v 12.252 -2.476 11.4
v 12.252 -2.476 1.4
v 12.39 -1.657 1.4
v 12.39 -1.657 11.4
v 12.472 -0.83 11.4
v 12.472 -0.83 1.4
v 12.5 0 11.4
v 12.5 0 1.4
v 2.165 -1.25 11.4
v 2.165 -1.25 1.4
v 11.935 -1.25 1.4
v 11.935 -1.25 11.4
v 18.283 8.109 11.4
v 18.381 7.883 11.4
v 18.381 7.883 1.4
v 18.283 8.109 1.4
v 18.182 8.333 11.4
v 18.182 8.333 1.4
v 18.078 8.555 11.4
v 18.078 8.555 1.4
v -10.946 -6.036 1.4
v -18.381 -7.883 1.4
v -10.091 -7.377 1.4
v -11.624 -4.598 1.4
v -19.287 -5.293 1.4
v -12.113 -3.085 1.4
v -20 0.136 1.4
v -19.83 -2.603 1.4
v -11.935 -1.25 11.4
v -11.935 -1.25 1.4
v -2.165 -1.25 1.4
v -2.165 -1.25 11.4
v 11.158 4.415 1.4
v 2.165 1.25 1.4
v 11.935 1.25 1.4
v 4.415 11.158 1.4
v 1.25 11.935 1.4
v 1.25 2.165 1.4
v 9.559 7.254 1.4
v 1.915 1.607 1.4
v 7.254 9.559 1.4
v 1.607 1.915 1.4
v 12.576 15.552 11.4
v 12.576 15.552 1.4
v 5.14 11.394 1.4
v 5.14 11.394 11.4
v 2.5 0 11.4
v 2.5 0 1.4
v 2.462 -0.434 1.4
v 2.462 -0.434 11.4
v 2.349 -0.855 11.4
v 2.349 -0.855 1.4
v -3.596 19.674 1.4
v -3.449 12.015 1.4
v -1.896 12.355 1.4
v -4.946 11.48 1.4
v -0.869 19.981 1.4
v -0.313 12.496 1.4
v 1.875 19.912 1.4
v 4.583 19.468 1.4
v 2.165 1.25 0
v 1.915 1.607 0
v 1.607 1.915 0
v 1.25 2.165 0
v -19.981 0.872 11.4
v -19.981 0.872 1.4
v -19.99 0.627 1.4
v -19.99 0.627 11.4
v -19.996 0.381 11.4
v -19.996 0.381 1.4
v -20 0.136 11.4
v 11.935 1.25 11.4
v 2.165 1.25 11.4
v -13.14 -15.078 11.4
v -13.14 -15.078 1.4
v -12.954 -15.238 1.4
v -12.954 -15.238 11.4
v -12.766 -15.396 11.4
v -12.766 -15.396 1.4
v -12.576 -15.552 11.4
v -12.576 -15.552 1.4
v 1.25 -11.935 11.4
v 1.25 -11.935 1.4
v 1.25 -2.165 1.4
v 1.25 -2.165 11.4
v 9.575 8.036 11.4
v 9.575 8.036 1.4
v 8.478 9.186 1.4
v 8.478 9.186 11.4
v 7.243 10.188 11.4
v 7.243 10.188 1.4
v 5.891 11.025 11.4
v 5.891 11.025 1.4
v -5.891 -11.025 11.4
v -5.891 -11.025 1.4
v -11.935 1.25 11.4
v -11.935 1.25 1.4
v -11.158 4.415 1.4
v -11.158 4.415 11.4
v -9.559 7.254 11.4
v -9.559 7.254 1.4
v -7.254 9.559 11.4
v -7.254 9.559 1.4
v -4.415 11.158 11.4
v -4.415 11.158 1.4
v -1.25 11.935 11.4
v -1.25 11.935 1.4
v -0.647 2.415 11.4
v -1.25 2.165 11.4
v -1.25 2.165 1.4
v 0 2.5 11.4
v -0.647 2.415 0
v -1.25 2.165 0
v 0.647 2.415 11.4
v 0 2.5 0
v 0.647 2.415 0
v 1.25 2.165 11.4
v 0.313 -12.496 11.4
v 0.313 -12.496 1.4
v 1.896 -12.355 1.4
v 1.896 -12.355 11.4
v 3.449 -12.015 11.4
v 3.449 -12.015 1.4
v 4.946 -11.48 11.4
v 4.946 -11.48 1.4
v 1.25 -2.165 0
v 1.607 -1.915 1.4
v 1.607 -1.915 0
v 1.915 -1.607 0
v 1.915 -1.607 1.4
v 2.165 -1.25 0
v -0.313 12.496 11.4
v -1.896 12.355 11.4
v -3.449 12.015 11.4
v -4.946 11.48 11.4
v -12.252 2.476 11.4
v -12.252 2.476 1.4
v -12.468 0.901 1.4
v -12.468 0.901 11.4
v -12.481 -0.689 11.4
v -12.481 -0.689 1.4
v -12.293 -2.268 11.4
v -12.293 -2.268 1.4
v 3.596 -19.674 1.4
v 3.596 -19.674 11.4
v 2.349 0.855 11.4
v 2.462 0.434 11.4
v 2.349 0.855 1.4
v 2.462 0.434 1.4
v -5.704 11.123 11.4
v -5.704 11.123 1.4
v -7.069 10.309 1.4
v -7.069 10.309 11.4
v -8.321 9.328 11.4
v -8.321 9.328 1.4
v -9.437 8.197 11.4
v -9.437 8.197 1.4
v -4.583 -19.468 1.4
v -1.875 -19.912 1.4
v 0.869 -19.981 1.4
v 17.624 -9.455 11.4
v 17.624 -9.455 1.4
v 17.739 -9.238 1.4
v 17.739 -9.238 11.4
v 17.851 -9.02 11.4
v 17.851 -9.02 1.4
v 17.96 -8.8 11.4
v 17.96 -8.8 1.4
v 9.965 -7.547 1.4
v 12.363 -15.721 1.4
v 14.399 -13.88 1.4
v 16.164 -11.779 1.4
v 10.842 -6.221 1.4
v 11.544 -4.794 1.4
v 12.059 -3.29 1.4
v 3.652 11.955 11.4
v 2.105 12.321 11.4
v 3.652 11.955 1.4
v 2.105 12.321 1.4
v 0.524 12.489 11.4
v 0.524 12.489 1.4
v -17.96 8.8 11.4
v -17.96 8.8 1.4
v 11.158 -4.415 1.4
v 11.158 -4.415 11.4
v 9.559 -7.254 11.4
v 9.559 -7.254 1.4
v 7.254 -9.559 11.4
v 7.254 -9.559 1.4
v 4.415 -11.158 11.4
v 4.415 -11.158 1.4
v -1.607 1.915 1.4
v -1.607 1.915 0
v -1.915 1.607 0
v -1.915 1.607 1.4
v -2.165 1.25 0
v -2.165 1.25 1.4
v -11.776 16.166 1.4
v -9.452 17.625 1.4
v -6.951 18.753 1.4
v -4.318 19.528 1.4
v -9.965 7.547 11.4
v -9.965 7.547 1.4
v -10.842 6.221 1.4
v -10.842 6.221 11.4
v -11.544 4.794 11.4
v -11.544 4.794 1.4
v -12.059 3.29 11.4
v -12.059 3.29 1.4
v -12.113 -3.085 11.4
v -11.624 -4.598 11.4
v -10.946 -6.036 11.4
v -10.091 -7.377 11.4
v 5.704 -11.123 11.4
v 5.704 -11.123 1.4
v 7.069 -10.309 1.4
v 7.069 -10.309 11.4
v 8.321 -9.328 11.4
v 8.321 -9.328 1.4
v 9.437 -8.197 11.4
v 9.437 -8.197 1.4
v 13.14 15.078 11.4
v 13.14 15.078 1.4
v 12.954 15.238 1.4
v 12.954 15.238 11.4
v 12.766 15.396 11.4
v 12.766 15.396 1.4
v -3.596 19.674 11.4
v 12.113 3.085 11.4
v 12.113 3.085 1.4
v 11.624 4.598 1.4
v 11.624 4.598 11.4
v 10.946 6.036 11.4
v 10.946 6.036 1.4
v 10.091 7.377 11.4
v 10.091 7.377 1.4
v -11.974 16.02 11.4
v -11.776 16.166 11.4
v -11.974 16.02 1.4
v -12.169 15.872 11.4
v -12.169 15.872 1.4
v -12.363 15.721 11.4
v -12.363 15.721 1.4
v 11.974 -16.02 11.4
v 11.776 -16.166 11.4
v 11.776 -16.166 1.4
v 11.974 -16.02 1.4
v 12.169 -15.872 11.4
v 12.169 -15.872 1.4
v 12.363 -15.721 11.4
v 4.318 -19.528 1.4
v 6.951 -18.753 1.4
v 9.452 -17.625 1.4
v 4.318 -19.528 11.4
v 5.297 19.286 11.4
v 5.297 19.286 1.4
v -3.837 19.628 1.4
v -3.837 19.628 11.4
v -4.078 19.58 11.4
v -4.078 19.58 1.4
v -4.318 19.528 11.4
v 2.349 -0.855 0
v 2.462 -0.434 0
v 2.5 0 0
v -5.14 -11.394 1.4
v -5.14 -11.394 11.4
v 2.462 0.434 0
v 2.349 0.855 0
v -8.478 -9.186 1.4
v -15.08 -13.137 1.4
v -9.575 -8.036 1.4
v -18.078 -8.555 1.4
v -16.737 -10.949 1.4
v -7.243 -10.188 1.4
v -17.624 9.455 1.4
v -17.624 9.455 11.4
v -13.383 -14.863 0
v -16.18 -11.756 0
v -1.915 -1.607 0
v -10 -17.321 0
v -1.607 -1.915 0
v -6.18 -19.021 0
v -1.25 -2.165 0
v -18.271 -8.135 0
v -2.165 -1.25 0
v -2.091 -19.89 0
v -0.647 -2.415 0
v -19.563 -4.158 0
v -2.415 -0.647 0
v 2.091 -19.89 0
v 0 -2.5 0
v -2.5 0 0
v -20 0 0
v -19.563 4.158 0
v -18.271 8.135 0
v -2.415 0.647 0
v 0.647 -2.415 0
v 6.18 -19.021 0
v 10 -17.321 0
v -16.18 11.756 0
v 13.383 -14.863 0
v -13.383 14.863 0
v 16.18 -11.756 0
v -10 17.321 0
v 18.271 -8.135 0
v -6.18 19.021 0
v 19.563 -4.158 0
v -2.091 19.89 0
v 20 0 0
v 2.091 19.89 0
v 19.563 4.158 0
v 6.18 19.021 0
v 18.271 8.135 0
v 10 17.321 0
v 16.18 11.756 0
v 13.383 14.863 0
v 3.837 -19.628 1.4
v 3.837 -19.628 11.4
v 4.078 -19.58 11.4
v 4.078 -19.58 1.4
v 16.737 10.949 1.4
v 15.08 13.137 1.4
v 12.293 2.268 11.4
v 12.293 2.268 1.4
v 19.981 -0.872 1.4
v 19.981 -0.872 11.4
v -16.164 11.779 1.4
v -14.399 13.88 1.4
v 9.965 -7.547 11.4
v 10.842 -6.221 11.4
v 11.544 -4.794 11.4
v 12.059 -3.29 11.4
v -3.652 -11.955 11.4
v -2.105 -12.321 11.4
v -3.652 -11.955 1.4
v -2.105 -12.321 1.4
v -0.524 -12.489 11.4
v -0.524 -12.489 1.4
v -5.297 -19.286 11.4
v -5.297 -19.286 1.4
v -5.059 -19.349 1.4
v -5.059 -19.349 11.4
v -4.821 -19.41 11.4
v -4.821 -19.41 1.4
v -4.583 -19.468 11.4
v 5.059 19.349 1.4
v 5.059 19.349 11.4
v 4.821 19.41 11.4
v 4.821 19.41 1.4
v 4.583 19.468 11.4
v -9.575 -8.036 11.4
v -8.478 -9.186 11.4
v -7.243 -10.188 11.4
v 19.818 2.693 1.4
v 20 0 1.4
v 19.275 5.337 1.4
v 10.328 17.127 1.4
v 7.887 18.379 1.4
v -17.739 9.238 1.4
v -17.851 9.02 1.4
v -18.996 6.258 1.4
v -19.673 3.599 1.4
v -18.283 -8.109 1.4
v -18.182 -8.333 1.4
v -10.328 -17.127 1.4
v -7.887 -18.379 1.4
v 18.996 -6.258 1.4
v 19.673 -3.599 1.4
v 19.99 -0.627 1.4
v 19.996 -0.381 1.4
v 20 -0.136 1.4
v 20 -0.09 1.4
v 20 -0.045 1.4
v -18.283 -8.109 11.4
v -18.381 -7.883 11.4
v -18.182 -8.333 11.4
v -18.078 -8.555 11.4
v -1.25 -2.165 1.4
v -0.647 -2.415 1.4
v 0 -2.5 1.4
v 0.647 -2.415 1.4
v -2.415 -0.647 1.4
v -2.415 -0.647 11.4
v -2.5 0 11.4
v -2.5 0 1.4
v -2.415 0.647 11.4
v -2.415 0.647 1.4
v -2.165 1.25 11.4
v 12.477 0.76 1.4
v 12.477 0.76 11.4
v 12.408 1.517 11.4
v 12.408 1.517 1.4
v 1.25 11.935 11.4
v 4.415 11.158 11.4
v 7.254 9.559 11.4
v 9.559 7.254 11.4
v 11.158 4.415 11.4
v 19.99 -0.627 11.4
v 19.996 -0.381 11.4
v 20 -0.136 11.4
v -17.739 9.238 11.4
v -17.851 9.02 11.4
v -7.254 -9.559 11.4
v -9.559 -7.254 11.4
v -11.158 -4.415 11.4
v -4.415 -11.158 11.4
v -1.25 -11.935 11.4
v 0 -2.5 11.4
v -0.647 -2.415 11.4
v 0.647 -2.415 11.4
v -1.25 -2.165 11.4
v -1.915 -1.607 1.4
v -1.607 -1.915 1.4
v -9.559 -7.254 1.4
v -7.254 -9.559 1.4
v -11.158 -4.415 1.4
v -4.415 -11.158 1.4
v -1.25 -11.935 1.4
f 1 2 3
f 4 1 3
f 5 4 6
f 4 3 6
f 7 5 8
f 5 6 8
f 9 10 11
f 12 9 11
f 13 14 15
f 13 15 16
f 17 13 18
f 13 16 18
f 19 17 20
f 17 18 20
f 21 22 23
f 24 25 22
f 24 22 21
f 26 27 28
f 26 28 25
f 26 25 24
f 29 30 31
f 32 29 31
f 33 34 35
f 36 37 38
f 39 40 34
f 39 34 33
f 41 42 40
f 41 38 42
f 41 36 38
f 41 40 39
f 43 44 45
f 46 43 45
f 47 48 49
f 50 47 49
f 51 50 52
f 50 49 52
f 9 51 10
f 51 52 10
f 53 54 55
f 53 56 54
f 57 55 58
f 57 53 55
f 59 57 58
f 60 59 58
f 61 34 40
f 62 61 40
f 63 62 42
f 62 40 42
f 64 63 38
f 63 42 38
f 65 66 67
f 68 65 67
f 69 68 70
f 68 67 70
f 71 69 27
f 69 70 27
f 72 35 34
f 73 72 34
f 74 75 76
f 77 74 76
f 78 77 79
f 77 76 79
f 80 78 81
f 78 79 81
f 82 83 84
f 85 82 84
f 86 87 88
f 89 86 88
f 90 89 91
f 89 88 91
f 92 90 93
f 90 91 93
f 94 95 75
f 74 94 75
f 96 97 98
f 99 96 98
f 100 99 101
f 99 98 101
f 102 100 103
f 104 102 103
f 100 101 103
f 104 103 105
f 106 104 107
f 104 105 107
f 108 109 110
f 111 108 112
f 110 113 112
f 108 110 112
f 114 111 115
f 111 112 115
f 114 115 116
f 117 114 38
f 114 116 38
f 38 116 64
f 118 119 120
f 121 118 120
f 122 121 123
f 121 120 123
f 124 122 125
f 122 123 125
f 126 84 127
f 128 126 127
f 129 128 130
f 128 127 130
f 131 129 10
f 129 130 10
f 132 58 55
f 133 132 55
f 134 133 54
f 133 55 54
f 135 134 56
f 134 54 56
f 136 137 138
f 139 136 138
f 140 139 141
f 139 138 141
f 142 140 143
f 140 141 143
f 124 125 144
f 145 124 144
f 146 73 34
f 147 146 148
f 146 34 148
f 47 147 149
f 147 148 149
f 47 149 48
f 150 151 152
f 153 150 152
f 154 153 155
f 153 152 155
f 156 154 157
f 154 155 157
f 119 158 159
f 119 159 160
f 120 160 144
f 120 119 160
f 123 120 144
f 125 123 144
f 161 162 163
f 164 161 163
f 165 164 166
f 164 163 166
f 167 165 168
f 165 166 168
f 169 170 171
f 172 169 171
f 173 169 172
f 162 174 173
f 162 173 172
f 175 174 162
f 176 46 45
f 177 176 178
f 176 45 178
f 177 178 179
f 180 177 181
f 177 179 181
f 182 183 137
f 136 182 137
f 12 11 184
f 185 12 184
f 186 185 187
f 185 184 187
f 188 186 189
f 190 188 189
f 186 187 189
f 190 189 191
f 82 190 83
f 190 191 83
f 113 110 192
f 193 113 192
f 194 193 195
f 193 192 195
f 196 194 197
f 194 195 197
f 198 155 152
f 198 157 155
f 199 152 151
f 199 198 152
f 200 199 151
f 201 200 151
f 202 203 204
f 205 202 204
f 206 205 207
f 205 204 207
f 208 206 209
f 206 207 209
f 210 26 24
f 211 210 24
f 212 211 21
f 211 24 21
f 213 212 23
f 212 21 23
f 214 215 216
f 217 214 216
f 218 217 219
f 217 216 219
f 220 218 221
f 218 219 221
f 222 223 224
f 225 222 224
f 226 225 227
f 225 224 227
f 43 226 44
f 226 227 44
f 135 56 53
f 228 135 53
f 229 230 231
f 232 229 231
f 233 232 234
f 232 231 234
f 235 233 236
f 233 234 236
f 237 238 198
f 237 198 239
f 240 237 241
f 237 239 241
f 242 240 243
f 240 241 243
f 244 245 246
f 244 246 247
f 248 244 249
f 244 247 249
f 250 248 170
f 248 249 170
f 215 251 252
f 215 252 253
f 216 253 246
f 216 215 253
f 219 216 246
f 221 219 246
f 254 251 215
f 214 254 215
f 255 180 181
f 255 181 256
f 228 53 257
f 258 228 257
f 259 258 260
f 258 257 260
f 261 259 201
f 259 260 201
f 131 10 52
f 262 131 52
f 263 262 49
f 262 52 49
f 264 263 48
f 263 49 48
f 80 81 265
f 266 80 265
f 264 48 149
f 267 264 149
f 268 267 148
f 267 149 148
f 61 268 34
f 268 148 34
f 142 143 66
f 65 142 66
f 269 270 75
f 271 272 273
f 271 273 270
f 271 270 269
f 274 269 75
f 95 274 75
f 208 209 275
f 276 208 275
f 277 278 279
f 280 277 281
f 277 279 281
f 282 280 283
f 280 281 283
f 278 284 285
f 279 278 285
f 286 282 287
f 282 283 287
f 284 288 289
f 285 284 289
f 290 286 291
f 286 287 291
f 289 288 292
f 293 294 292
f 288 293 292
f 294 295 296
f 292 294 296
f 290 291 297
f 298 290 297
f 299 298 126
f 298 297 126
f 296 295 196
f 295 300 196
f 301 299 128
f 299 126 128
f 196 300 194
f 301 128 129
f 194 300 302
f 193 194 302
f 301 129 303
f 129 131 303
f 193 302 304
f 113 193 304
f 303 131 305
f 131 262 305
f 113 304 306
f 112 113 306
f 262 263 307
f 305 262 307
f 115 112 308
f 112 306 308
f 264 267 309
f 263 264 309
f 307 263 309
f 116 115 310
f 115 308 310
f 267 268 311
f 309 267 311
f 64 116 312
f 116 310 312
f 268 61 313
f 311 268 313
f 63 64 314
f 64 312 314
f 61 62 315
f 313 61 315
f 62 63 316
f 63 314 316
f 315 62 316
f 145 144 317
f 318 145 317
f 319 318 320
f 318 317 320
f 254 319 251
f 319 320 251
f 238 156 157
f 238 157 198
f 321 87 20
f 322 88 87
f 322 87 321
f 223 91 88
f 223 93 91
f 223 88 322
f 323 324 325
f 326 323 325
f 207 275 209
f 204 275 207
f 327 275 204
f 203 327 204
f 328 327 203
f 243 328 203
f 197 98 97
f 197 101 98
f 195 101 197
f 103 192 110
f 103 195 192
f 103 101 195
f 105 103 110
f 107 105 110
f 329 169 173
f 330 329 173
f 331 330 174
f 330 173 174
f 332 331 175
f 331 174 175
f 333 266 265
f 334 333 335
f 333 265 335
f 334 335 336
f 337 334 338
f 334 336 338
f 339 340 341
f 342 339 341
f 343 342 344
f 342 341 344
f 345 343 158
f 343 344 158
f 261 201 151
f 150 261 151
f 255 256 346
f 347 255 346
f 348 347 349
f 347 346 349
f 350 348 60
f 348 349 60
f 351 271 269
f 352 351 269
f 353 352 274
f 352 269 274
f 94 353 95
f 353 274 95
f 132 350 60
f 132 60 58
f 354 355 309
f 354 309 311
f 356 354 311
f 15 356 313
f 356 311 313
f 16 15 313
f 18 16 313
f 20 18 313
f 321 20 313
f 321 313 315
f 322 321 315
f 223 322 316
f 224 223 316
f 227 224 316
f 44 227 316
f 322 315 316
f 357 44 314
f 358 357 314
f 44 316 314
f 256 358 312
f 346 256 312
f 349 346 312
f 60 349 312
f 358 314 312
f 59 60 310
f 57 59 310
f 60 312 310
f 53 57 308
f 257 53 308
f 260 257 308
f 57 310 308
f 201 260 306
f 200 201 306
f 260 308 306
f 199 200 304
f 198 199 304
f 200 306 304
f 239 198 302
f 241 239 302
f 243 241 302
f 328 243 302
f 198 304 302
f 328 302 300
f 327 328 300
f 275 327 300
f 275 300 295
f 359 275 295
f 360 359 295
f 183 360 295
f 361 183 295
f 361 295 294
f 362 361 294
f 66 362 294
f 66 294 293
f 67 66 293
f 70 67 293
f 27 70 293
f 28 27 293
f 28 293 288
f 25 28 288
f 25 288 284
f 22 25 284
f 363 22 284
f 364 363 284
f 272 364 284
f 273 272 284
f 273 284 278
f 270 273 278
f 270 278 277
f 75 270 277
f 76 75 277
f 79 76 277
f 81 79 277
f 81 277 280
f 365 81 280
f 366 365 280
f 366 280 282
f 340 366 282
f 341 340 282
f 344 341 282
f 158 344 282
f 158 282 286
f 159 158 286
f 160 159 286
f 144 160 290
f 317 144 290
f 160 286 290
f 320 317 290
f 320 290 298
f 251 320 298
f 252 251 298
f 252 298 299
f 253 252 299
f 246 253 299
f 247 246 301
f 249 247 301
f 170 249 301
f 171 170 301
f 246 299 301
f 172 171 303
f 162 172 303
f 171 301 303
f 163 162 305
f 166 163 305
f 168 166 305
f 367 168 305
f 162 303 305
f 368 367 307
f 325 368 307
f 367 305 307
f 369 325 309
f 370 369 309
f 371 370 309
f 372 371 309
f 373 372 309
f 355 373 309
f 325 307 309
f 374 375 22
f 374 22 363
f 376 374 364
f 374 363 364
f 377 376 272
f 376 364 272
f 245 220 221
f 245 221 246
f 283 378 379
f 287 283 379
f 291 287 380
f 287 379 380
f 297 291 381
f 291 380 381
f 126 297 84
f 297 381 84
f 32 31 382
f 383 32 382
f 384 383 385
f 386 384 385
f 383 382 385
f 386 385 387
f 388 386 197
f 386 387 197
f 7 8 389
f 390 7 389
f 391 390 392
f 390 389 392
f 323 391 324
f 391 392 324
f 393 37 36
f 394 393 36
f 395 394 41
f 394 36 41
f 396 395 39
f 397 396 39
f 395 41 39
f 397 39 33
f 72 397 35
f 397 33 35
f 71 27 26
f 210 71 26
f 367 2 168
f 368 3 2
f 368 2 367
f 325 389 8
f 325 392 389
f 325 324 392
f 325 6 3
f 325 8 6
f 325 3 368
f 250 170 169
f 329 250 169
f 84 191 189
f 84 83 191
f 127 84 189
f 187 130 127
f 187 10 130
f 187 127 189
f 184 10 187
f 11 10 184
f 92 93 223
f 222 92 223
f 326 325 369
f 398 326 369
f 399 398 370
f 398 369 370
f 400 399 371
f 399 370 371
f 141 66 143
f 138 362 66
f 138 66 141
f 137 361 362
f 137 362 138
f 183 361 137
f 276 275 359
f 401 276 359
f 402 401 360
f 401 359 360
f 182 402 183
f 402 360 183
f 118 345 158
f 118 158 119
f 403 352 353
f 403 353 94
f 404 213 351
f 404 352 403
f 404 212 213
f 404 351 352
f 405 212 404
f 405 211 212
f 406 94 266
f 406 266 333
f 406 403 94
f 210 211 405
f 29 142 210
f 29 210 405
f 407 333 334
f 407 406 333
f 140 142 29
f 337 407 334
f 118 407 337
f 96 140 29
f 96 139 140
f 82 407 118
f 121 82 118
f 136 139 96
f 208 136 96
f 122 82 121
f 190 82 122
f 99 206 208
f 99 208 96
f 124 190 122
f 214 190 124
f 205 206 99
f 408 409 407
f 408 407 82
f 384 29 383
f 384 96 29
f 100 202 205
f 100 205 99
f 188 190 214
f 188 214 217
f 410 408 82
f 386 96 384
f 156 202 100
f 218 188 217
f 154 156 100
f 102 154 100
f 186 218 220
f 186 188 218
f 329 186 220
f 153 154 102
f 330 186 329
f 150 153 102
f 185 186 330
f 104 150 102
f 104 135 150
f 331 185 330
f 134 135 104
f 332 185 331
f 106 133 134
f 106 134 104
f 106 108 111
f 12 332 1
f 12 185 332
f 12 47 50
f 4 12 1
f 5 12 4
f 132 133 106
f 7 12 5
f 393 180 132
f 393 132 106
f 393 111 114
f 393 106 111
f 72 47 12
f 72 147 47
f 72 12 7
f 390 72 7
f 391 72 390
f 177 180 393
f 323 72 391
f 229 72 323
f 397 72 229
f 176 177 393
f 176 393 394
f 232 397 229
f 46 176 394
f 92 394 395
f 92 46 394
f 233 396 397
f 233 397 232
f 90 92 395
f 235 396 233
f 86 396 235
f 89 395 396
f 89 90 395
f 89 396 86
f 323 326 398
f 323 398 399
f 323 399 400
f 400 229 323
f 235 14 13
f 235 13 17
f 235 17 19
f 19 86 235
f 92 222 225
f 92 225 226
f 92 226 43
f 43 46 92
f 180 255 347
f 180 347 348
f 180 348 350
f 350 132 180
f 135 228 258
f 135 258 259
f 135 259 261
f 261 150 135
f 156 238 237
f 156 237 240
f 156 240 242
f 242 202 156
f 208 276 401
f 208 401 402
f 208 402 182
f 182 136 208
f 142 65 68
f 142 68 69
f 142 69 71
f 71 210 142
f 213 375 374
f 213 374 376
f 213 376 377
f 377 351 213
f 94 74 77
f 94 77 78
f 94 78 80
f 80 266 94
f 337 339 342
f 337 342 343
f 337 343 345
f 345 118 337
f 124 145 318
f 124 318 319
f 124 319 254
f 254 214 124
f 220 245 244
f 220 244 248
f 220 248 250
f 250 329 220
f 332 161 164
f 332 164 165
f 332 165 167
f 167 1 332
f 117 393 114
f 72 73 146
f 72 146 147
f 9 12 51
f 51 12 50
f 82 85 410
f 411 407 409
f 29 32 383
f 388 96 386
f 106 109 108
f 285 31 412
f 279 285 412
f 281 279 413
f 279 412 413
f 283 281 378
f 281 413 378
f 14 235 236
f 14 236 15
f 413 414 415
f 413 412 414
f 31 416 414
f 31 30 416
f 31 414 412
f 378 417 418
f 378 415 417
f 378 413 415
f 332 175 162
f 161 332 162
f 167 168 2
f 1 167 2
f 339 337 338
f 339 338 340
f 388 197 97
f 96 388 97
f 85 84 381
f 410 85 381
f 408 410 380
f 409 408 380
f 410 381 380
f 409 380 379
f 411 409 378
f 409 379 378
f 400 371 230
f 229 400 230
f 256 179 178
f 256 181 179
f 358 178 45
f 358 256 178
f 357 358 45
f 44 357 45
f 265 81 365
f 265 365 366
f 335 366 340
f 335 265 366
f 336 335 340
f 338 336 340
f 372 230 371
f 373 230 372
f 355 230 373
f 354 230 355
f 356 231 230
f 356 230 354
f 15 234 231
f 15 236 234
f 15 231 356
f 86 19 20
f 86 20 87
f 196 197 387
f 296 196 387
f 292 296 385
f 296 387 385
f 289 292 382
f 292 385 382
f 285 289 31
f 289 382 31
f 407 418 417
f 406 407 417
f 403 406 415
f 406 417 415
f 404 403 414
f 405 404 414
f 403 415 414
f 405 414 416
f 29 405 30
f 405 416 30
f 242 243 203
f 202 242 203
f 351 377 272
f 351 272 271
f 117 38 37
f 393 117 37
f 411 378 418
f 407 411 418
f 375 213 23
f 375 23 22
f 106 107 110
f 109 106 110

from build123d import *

# Parameters (mm, degrees)
F0_R     = 20
F1_DEPTH = 1.4
F3_DEPTH = 10
F4_DEPTH = 10
F5_DEPTH = 25.4
F6_DEPTH = 10


# Not quite as in the source:
# - after a boolean that leaves OpenCascade's solid faulty, fix() repairs it


with BuildPart() as f1:
    # F0 (on Top) → F1 (new body)
    with BuildSketch(Plane.XY):
        Circle(F0_R)
    extrude(amount=F1_DEPTH)

    # F2 (on face) → F3 (join)
    with BuildSketch(Plane.XY.offset(1.4)):
        with BuildLine():
            ThreePointArc((-5.7035176523, 11.1229441422), (-5.3278826262, 11.3076817572), (-4.9462725406, 11.4797381483))
            Line((-4.9462725406, 11.4797381483), (-3.5956301682, 19.6741313326))
            ThreePointArc((-3.5956301682, 19.6741313326), (-3.9575397764, 19.6045372023), (-4.3181055831, 19.528286258))
            Line((-4.3181055831, 19.528286258), (-5.7035176523, 11.1229441422))
        make_face()
        with BuildLine():
            ThreePointArc((-0.3126272478, 12.4960899566), (0.1059628635, 12.4995508668), (0.5244341406, 12.4889939079))
            Line((0.5244341406, 12.4889939079), (5.2967348245, 19.2858652956))
            ThreePointArc((5.2967348245, 19.2858652956), (4.940469773, 19.3801898448), (4.5825271615, 19.4679337582))
            Line((4.5825271615, 19.4679337582), (-0.3126272478, 12.4960899566))
        make_face()
        with BuildLine():
            ThreePointArc((5.1401828172, 11.3942319007), (5.5188211085, 11.2157306303), (5.8912702085, 11.0246512566))
            Line((5.8912702085, 11.0246512566), (13.140016525, 15.0777971111))
            ThreePointArc((13.140016525, 15.0777971111), (12.859958693, 15.3173582061), (12.5755342007, 15.5517182191))
            Line((12.5755342007, 15.5517182191), (5.1401828172, 11.3942319007))
        make_face()
        with BuildLine():
            ThreePointArc((9.574916635, 8.0356064757), (9.8386091491, 7.7104973906), (10.09126796, 7.3767412155))
            Line((10.09126796, 7.3767412155), (18.3807568009, 7.8833862917))
            ThreePointArc((18.3807568009, 7.8833862917), (18.2323750768, 8.2207359196), (18.0778024627, 8.5552941574))
            Line((18.0778024627, 8.5552941574), (9.574916635, 8.0356064757))
        make_face()
        with BuildLine():
            ThreePointArc((12.1132207847, 3.085430638), (12.2097399851, 2.6781055797), (12.2925663307, 2.2677771068))
            Line((12.2925663307, 2.2677771068), (19.9809627673, -0.8724258661))
            ThreePointArc((19.9809627673, -0.8724258661), (19.9936459712, -0.5041039365), (19.9995402372, -0.135610836))
            Line((19.9995402372, -0.135610836), (12.1132207847, 3.085430638))
        make_face()
        with BuildLine():
            Line((17.9601237896, -8.7996564401), (12.252352999, -2.4758525779))
            ThreePointArc((12.252352999, -2.4758525779), (12.1625820744, -2.8847178862), (12.0591711811, -3.2903480703))
            Line((12.0591711811, -3.2903480703), (17.6236940072, -9.4554433816))
            ThreePointArc((17.6236940072, -9.4554433816), (17.794930075, -9.1290998255), (17.9601237896, -8.7996564401))
        make_face()
        with BuildLine():
            Line((12.3634845589, -15.7208221656), (9.9647564366, -7.5467628264))
            ThreePointArc((9.9647564366, -7.5467628264), (9.7064756196, -7.8761875959), (9.4373092832, -8.1967794587))
            Line((9.4373092832, -8.1967794587), (11.7758365085, -16.1656943719))
            ThreePointArc((11.7758365085, -16.1656943719), (12.071710037, -15.9459655331), (12.3634845589, -15.7208221656))
        make_face()
        with BuildLine():
            Line((4.3181055831, -19.528286258), (5.7035176523, -11.1229441422))
            ThreePointArc((5.7035176523, -11.1229441422), (5.3278826262, -11.3076817572), (4.9462725406, -11.4797381483))
            Line((4.9462725406, -11.4797381483), (3.5956301682, -19.6741313326))
            ThreePointArc((3.5956301682, -19.6741313326), (3.9575397764, -19.6045372023), (4.3181055831, -19.528286258))
        make_face()
        with BuildLine():
            Line((-4.5825271615, -19.4679337582), (0.3126272478, -12.4960899566))
            ThreePointArc((0.3126272478, -12.4960899566), (-0.1059628635, -12.4995508668), (-0.5244341406, -12.4889939079))
            Line((-0.5244341406, -12.4889939079), (-5.2967348245, -19.2858652956))
            ThreePointArc((-5.2967348245, -19.2858652956), (-4.940469773, -19.3801898448), (-4.5825271615, -19.4679337582))
        make_face()
        with BuildLine():
            Line((-12.5755342007, -15.5517182191), (-5.1401828172, -11.3942319007))
            ThreePointArc((-5.1401828172, -11.3942319007), (-5.5188211085, -11.2157306303), (-5.8912702085, -11.0246512566))
            Line((-5.8912702085, -11.0246512566), (-13.140016525, -15.0777971111))
            ThreePointArc((-13.140016525, -15.0777971111), (-12.859958693, -15.3173582061), (-12.5755342007, -15.5517182191))
        make_face()
        with BuildLine():
            Line((-18.0778024627, -8.5552941574), (-9.574916635, -8.0356064757))
            ThreePointArc((-9.574916635, -8.0356064757), (-9.8386091491, -7.7104973906), (-10.09126796, -7.3767412155))
            Line((-10.09126796, -7.3767412155), (-18.3807568009, -7.8833862917))
            ThreePointArc((-18.3807568009, -7.8833862917), (-18.2323750768, -8.2207359196), (-18.0778024627, -8.5552941574))
        make_face()
        with BuildLine():
            Line((-19.9995402372, 0.135610836), (-12.1132207847, -3.085430638))
            ThreePointArc((-12.1132207847, -3.085430638), (-12.2097399851, -2.6781055797), (-12.2925663307, -2.2677771068))
            Line((-12.2925663307, -2.2677771068), (-19.9809627673, 0.8724258661))
            ThreePointArc((-19.9809627673, 0.8724258661), (-19.9936459712, 0.5041039365), (-19.9995402372, 0.135610836))
        make_face()
        with BuildLine():
            ThreePointArc((-12.252352999, 2.4758525779), (-12.1625820744, 2.8847178862), (-12.0591711811, 3.2903480703))
            Line((-12.0591711811, 3.2903480703), (-17.6236940072, 9.4554433816))
            ThreePointArc((-17.6236940072, 9.4554433816), (-17.794930075, 9.1290998255), (-17.9601237896, 8.7996564401))
            Line((-17.9601237896, 8.7996564401), (-12.252352999, 2.4758525779))
        make_face()
        with BuildLine():
            ThreePointArc((-9.9647564366, 7.5467628264), (-9.7064756196, 7.8761875959), (-9.4373092832, 8.1967794587))
            Line((-9.4373092832, 8.1967794587), (-11.7758365085, 16.1656943719))
            ThreePointArc((-11.7758365085, 16.1656943719), (-12.071710037, 15.9459655331), (-12.3634845589, 15.7208221656))
            Line((-12.3634845589, 15.7208221656), (-9.9647564366, 7.5467628264))
        make_face()
    extrude(amount=F3_DEPTH)

    # F2 (on face) → F4 (join)
    with BuildSketch(Plane.XY.offset(1.4)):
        with BuildLine():
            ThreePointArc((12.252352999, -2.4758525779), (12.437934163, -1.2441035954), (12.5, 0))
            ThreePointArc((12.5, 0), (12.4480335622, 1.1386221644), (12.2925663307, 2.2677771068))
            ThreePointArc((12.2925663307, 2.2677771068), (12.2097399851, 2.6781055797), (12.1132207847, 3.085430638))
            ThreePointArc((12.1132207847, 3.085430638), (11.3076817572, 5.3278826262), (10.09126796, 7.3767412155))
            ThreePointArc((10.09126796, 7.3767412155), (9.8386091491, 7.7104973906), (9.574916635, 8.0356064757))
            ThreePointArc((9.574916635, 8.0356064757), (7.8761875959, 9.7064756196), (5.8912702085, 11.0246512566))
            ThreePointArc((5.8912702085, 11.0246512566), (5.5188211085, 11.2157306303), (5.1401828172, 11.3942319007))
            ThreePointArc((5.1401828172, 11.3942319007), (2.8847178862, 12.1625820744), (0.5244341406, 12.4889939079))
            ThreePointArc((0.5244341406, 12.4889939079), (0.1059628635, 12.4995508668), (-0.3126272478, 12.4960899566))
            ThreePointArc((-0.3126272478, 12.4960899566), (-2.6781055797, 12.2097399851), (-4.9462725406, 11.4797381483))
            ThreePointArc((-4.9462725406, 11.4797381483), (-5.3278826262, 11.3076817572), (-5.7035176523, 11.1229441422))
            ThreePointArc((-5.7035176523, 11.1229441422), (-7.7104973906, 9.8386091491), (-9.4373092832, 8.1967794587))
            ThreePointArc((-9.4373092832, 8.1967794587), (-9.7064756196, 7.8761875959), (-9.9647564366, 7.5467628264))
            ThreePointArc((-9.9647564366, 7.5467628264), (-11.2157306303, 5.5188211085), (-12.0591711811, 3.2903480703))
            ThreePointArc((-12.0591711811, 3.2903480703), (-12.1625820744, 2.8847178862), (-12.252352999, 2.4758525779))
            ThreePointArc((-12.252352999, 2.4758525779), (-12.4995508668, 0.1059628635), (-12.2925663307, -2.2677771068))
            ThreePointArc((-12.2925663307, -2.2677771068), (-12.2097399851, -2.6781055797), (-12.1132207847, -3.085430638))
            ThreePointArc((-12.1132207847, -3.085430638), (-11.3076817572, -5.3278826262), (-10.09126796, -7.3767412155))
            ThreePointArc((-10.09126796, -7.3767412155), (-9.8386091491, -7.7104973906), (-9.574916635, -8.0356064757))
            ThreePointArc((-9.574916635, -8.0356064757), (-7.8761875959, -9.7064756196), (-5.8912702085, -11.0246512566))
            ThreePointArc((-5.8912702085, -11.0246512566), (-5.5188211085, -11.2157306303), (-5.1401828172, -11.3942319007))
            ThreePointArc((-5.1401828172, -11.3942319007), (-2.8847178862, -12.1625820744), (-0.5244341406, -12.4889939079))
            ThreePointArc((-0.5244341406, -12.4889939079), (-0.1059628635, -12.4995508668), (0.3126272478, -12.4960899566))
            ThreePointArc((0.3126272478, -12.4960899566), (2.6781055797, -12.2097399851), (4.9462725406, -11.4797381483))
            ThreePointArc((4.9462725406, -11.4797381483), (5.3278826262, -11.3076817572), (5.7035176523, -11.1229441422))
            ThreePointArc((5.7035176523, -11.1229441422), (7.7104973906, -9.8386091491), (9.4373092832, -8.1967794587))
            ThreePointArc((9.4373092832, -8.1967794587), (9.7064756196, -7.8761875959), (9.9647564366, -7.5467628264))
            ThreePointArc((9.9647564366, -7.5467628264), (11.2157306303, -5.5188211085), (12.0591711811, -3.2903480703))
            ThreePointArc((12.0591711811, -3.2903480703), (12.1625820744, -2.8847178862), (12.252352999, -2.4758525779))
        make_face()
        with BuildLine():
            ThreePointArc((11.9347182623, 1.25), (11.9836684523, 0.6258517607), (12, 0))
            ThreePointArc((12, 0), (11.9836684523, -0.6258517607), (11.9347182623, -1.25))
            ThreePointArc((11.9347182623, -1.25), (8.4852813742, -8.4852813742), (1.25, -11.9347182623))
            ThreePointArc((1.25, -11.9347182623), (0, -12), (-1.25, -11.9347182623))
            ThreePointArc((-1.25, -11.9347182623), (-8.4852813742, -8.4852813742), (-11.9347182623, -1.25))
            ThreePointArc((-11.9347182623, -1.25), (-12, 0), (-11.9347182623, 1.25))
            ThreePointArc((-11.9347182623, 1.25), (-8.4852813742, 8.4852813742), (-1.25, 11.9347182623))
            ThreePointArc((-1.25, 11.9347182623), (0, 12), (1.25, 11.9347182623))
            ThreePointArc((1.25, 11.9347182623), (8.4852813742, 8.4852813742), (11.9347182623, 1.25))
        make_face(mode=Mode.SUBTRACT)
    extrude(amount=F4_DEPTH)

    # F2 (on face) → F5 (cut)
    with BuildSketch(Plane.XY.offset(1.4)):
        with BuildLine():
            ThreePointArc((2.5, 0), (2.4148145657, 0.6470476128), (2.1650635095, 1.25))
            ThreePointArc((2.1650635095, 1.25), (1.767766953, 1.767766953), (1.25, 2.1650635095))
            ThreePointArc((1.25, 2.1650635095), (0, 2.5), (-1.25, 2.1650635095))
            ThreePointArc((-1.25, 2.1650635095), (-1.767766953, 1.767766953), (-2.1650635095, 1.25))
            ThreePointArc((-2.1650635095, 1.25), (-2.5, 0), (-2.1650635095, -1.25))
            ThreePointArc((-2.1650635095, -1.25), (-1.767766953, -1.767766953), (-1.25, -2.1650635095))
            ThreePointArc((-1.25, -2.1650635095), (0, -2.5), (1.25, -2.1650635095))
            ThreePointArc((1.25, -2.1650635095), (1.767766953, -1.767766953), (2.1650635095, -1.25))
            ThreePointArc((2.1650635095, -1.25), (2.4148145657, -0.6470476128), (2.5, 0))
        make_face()
    extrude(amount=-F5_DEPTH, mode=Mode.SUBTRACT)

    # F2 (on face) → F6 (join)
    with BuildSketch(Plane.XY.offset(1.4)):
        with BuildLine():
            Line((1.25, 2.1650635095), (1.25, 11.9347182623))
            ThreePointArc((1.25, 11.9347182623), (0, 12), (-1.25, 11.9347182623))
            Line((-1.25, 11.9347182623), (-1.25, 2.1650635095))
            ThreePointArc((-1.25, 2.1650635095), (0, 2.5), (1.25, 2.1650635095))
        make_face()
        with BuildLine():
            ThreePointArc((11.9347182623, -1.25), (11.9836684523, -0.6258517607), (12, 0))
            ThreePointArc((12, 0), (11.9836684523, 0.6258517607), (11.9347182623, 1.25))
            Line((11.9347182623, 1.25), (2.1650635095, 1.25))
            ThreePointArc((2.1650635095, 1.25), (2.4148145657, 0.6470476128), (2.5, 0))
            ThreePointArc((2.5, 0), (2.4148145657, -0.6470476128), (2.1650635095, -1.25))
            Line((2.1650635095, -1.25), (11.9347182623, -1.25))
        make_face()
        with BuildLine():
            ThreePointArc((-1.25, -11.9347182623), (0, -12), (1.25, -11.9347182623))
            Line((1.25, -11.9347182623), (1.25, -2.1650635095))
            ThreePointArc((1.25, -2.1650635095), (0, -2.5), (-1.25, -2.1650635095))
            Line((-1.25, -2.1650635095), (-1.25, -11.9347182623))
        make_face()
        with BuildLine():
            Line((-2.1650635095, 1.25), (-11.9347182623, 1.25))
            ThreePointArc((-11.9347182623, 1.25), (-12, 0), (-11.9347182623, -1.25))
            Line((-11.9347182623, -1.25), (-2.1650635095, -1.25))
            ThreePointArc((-2.1650635095, -1.25), (-2.5, 0), (-2.1650635095, 1.25))
        make_face()
    extrude(amount=F6_DEPTH)

    add(f1.part.fix(), mode=Mode.REPLACE)


solid = f1.part
